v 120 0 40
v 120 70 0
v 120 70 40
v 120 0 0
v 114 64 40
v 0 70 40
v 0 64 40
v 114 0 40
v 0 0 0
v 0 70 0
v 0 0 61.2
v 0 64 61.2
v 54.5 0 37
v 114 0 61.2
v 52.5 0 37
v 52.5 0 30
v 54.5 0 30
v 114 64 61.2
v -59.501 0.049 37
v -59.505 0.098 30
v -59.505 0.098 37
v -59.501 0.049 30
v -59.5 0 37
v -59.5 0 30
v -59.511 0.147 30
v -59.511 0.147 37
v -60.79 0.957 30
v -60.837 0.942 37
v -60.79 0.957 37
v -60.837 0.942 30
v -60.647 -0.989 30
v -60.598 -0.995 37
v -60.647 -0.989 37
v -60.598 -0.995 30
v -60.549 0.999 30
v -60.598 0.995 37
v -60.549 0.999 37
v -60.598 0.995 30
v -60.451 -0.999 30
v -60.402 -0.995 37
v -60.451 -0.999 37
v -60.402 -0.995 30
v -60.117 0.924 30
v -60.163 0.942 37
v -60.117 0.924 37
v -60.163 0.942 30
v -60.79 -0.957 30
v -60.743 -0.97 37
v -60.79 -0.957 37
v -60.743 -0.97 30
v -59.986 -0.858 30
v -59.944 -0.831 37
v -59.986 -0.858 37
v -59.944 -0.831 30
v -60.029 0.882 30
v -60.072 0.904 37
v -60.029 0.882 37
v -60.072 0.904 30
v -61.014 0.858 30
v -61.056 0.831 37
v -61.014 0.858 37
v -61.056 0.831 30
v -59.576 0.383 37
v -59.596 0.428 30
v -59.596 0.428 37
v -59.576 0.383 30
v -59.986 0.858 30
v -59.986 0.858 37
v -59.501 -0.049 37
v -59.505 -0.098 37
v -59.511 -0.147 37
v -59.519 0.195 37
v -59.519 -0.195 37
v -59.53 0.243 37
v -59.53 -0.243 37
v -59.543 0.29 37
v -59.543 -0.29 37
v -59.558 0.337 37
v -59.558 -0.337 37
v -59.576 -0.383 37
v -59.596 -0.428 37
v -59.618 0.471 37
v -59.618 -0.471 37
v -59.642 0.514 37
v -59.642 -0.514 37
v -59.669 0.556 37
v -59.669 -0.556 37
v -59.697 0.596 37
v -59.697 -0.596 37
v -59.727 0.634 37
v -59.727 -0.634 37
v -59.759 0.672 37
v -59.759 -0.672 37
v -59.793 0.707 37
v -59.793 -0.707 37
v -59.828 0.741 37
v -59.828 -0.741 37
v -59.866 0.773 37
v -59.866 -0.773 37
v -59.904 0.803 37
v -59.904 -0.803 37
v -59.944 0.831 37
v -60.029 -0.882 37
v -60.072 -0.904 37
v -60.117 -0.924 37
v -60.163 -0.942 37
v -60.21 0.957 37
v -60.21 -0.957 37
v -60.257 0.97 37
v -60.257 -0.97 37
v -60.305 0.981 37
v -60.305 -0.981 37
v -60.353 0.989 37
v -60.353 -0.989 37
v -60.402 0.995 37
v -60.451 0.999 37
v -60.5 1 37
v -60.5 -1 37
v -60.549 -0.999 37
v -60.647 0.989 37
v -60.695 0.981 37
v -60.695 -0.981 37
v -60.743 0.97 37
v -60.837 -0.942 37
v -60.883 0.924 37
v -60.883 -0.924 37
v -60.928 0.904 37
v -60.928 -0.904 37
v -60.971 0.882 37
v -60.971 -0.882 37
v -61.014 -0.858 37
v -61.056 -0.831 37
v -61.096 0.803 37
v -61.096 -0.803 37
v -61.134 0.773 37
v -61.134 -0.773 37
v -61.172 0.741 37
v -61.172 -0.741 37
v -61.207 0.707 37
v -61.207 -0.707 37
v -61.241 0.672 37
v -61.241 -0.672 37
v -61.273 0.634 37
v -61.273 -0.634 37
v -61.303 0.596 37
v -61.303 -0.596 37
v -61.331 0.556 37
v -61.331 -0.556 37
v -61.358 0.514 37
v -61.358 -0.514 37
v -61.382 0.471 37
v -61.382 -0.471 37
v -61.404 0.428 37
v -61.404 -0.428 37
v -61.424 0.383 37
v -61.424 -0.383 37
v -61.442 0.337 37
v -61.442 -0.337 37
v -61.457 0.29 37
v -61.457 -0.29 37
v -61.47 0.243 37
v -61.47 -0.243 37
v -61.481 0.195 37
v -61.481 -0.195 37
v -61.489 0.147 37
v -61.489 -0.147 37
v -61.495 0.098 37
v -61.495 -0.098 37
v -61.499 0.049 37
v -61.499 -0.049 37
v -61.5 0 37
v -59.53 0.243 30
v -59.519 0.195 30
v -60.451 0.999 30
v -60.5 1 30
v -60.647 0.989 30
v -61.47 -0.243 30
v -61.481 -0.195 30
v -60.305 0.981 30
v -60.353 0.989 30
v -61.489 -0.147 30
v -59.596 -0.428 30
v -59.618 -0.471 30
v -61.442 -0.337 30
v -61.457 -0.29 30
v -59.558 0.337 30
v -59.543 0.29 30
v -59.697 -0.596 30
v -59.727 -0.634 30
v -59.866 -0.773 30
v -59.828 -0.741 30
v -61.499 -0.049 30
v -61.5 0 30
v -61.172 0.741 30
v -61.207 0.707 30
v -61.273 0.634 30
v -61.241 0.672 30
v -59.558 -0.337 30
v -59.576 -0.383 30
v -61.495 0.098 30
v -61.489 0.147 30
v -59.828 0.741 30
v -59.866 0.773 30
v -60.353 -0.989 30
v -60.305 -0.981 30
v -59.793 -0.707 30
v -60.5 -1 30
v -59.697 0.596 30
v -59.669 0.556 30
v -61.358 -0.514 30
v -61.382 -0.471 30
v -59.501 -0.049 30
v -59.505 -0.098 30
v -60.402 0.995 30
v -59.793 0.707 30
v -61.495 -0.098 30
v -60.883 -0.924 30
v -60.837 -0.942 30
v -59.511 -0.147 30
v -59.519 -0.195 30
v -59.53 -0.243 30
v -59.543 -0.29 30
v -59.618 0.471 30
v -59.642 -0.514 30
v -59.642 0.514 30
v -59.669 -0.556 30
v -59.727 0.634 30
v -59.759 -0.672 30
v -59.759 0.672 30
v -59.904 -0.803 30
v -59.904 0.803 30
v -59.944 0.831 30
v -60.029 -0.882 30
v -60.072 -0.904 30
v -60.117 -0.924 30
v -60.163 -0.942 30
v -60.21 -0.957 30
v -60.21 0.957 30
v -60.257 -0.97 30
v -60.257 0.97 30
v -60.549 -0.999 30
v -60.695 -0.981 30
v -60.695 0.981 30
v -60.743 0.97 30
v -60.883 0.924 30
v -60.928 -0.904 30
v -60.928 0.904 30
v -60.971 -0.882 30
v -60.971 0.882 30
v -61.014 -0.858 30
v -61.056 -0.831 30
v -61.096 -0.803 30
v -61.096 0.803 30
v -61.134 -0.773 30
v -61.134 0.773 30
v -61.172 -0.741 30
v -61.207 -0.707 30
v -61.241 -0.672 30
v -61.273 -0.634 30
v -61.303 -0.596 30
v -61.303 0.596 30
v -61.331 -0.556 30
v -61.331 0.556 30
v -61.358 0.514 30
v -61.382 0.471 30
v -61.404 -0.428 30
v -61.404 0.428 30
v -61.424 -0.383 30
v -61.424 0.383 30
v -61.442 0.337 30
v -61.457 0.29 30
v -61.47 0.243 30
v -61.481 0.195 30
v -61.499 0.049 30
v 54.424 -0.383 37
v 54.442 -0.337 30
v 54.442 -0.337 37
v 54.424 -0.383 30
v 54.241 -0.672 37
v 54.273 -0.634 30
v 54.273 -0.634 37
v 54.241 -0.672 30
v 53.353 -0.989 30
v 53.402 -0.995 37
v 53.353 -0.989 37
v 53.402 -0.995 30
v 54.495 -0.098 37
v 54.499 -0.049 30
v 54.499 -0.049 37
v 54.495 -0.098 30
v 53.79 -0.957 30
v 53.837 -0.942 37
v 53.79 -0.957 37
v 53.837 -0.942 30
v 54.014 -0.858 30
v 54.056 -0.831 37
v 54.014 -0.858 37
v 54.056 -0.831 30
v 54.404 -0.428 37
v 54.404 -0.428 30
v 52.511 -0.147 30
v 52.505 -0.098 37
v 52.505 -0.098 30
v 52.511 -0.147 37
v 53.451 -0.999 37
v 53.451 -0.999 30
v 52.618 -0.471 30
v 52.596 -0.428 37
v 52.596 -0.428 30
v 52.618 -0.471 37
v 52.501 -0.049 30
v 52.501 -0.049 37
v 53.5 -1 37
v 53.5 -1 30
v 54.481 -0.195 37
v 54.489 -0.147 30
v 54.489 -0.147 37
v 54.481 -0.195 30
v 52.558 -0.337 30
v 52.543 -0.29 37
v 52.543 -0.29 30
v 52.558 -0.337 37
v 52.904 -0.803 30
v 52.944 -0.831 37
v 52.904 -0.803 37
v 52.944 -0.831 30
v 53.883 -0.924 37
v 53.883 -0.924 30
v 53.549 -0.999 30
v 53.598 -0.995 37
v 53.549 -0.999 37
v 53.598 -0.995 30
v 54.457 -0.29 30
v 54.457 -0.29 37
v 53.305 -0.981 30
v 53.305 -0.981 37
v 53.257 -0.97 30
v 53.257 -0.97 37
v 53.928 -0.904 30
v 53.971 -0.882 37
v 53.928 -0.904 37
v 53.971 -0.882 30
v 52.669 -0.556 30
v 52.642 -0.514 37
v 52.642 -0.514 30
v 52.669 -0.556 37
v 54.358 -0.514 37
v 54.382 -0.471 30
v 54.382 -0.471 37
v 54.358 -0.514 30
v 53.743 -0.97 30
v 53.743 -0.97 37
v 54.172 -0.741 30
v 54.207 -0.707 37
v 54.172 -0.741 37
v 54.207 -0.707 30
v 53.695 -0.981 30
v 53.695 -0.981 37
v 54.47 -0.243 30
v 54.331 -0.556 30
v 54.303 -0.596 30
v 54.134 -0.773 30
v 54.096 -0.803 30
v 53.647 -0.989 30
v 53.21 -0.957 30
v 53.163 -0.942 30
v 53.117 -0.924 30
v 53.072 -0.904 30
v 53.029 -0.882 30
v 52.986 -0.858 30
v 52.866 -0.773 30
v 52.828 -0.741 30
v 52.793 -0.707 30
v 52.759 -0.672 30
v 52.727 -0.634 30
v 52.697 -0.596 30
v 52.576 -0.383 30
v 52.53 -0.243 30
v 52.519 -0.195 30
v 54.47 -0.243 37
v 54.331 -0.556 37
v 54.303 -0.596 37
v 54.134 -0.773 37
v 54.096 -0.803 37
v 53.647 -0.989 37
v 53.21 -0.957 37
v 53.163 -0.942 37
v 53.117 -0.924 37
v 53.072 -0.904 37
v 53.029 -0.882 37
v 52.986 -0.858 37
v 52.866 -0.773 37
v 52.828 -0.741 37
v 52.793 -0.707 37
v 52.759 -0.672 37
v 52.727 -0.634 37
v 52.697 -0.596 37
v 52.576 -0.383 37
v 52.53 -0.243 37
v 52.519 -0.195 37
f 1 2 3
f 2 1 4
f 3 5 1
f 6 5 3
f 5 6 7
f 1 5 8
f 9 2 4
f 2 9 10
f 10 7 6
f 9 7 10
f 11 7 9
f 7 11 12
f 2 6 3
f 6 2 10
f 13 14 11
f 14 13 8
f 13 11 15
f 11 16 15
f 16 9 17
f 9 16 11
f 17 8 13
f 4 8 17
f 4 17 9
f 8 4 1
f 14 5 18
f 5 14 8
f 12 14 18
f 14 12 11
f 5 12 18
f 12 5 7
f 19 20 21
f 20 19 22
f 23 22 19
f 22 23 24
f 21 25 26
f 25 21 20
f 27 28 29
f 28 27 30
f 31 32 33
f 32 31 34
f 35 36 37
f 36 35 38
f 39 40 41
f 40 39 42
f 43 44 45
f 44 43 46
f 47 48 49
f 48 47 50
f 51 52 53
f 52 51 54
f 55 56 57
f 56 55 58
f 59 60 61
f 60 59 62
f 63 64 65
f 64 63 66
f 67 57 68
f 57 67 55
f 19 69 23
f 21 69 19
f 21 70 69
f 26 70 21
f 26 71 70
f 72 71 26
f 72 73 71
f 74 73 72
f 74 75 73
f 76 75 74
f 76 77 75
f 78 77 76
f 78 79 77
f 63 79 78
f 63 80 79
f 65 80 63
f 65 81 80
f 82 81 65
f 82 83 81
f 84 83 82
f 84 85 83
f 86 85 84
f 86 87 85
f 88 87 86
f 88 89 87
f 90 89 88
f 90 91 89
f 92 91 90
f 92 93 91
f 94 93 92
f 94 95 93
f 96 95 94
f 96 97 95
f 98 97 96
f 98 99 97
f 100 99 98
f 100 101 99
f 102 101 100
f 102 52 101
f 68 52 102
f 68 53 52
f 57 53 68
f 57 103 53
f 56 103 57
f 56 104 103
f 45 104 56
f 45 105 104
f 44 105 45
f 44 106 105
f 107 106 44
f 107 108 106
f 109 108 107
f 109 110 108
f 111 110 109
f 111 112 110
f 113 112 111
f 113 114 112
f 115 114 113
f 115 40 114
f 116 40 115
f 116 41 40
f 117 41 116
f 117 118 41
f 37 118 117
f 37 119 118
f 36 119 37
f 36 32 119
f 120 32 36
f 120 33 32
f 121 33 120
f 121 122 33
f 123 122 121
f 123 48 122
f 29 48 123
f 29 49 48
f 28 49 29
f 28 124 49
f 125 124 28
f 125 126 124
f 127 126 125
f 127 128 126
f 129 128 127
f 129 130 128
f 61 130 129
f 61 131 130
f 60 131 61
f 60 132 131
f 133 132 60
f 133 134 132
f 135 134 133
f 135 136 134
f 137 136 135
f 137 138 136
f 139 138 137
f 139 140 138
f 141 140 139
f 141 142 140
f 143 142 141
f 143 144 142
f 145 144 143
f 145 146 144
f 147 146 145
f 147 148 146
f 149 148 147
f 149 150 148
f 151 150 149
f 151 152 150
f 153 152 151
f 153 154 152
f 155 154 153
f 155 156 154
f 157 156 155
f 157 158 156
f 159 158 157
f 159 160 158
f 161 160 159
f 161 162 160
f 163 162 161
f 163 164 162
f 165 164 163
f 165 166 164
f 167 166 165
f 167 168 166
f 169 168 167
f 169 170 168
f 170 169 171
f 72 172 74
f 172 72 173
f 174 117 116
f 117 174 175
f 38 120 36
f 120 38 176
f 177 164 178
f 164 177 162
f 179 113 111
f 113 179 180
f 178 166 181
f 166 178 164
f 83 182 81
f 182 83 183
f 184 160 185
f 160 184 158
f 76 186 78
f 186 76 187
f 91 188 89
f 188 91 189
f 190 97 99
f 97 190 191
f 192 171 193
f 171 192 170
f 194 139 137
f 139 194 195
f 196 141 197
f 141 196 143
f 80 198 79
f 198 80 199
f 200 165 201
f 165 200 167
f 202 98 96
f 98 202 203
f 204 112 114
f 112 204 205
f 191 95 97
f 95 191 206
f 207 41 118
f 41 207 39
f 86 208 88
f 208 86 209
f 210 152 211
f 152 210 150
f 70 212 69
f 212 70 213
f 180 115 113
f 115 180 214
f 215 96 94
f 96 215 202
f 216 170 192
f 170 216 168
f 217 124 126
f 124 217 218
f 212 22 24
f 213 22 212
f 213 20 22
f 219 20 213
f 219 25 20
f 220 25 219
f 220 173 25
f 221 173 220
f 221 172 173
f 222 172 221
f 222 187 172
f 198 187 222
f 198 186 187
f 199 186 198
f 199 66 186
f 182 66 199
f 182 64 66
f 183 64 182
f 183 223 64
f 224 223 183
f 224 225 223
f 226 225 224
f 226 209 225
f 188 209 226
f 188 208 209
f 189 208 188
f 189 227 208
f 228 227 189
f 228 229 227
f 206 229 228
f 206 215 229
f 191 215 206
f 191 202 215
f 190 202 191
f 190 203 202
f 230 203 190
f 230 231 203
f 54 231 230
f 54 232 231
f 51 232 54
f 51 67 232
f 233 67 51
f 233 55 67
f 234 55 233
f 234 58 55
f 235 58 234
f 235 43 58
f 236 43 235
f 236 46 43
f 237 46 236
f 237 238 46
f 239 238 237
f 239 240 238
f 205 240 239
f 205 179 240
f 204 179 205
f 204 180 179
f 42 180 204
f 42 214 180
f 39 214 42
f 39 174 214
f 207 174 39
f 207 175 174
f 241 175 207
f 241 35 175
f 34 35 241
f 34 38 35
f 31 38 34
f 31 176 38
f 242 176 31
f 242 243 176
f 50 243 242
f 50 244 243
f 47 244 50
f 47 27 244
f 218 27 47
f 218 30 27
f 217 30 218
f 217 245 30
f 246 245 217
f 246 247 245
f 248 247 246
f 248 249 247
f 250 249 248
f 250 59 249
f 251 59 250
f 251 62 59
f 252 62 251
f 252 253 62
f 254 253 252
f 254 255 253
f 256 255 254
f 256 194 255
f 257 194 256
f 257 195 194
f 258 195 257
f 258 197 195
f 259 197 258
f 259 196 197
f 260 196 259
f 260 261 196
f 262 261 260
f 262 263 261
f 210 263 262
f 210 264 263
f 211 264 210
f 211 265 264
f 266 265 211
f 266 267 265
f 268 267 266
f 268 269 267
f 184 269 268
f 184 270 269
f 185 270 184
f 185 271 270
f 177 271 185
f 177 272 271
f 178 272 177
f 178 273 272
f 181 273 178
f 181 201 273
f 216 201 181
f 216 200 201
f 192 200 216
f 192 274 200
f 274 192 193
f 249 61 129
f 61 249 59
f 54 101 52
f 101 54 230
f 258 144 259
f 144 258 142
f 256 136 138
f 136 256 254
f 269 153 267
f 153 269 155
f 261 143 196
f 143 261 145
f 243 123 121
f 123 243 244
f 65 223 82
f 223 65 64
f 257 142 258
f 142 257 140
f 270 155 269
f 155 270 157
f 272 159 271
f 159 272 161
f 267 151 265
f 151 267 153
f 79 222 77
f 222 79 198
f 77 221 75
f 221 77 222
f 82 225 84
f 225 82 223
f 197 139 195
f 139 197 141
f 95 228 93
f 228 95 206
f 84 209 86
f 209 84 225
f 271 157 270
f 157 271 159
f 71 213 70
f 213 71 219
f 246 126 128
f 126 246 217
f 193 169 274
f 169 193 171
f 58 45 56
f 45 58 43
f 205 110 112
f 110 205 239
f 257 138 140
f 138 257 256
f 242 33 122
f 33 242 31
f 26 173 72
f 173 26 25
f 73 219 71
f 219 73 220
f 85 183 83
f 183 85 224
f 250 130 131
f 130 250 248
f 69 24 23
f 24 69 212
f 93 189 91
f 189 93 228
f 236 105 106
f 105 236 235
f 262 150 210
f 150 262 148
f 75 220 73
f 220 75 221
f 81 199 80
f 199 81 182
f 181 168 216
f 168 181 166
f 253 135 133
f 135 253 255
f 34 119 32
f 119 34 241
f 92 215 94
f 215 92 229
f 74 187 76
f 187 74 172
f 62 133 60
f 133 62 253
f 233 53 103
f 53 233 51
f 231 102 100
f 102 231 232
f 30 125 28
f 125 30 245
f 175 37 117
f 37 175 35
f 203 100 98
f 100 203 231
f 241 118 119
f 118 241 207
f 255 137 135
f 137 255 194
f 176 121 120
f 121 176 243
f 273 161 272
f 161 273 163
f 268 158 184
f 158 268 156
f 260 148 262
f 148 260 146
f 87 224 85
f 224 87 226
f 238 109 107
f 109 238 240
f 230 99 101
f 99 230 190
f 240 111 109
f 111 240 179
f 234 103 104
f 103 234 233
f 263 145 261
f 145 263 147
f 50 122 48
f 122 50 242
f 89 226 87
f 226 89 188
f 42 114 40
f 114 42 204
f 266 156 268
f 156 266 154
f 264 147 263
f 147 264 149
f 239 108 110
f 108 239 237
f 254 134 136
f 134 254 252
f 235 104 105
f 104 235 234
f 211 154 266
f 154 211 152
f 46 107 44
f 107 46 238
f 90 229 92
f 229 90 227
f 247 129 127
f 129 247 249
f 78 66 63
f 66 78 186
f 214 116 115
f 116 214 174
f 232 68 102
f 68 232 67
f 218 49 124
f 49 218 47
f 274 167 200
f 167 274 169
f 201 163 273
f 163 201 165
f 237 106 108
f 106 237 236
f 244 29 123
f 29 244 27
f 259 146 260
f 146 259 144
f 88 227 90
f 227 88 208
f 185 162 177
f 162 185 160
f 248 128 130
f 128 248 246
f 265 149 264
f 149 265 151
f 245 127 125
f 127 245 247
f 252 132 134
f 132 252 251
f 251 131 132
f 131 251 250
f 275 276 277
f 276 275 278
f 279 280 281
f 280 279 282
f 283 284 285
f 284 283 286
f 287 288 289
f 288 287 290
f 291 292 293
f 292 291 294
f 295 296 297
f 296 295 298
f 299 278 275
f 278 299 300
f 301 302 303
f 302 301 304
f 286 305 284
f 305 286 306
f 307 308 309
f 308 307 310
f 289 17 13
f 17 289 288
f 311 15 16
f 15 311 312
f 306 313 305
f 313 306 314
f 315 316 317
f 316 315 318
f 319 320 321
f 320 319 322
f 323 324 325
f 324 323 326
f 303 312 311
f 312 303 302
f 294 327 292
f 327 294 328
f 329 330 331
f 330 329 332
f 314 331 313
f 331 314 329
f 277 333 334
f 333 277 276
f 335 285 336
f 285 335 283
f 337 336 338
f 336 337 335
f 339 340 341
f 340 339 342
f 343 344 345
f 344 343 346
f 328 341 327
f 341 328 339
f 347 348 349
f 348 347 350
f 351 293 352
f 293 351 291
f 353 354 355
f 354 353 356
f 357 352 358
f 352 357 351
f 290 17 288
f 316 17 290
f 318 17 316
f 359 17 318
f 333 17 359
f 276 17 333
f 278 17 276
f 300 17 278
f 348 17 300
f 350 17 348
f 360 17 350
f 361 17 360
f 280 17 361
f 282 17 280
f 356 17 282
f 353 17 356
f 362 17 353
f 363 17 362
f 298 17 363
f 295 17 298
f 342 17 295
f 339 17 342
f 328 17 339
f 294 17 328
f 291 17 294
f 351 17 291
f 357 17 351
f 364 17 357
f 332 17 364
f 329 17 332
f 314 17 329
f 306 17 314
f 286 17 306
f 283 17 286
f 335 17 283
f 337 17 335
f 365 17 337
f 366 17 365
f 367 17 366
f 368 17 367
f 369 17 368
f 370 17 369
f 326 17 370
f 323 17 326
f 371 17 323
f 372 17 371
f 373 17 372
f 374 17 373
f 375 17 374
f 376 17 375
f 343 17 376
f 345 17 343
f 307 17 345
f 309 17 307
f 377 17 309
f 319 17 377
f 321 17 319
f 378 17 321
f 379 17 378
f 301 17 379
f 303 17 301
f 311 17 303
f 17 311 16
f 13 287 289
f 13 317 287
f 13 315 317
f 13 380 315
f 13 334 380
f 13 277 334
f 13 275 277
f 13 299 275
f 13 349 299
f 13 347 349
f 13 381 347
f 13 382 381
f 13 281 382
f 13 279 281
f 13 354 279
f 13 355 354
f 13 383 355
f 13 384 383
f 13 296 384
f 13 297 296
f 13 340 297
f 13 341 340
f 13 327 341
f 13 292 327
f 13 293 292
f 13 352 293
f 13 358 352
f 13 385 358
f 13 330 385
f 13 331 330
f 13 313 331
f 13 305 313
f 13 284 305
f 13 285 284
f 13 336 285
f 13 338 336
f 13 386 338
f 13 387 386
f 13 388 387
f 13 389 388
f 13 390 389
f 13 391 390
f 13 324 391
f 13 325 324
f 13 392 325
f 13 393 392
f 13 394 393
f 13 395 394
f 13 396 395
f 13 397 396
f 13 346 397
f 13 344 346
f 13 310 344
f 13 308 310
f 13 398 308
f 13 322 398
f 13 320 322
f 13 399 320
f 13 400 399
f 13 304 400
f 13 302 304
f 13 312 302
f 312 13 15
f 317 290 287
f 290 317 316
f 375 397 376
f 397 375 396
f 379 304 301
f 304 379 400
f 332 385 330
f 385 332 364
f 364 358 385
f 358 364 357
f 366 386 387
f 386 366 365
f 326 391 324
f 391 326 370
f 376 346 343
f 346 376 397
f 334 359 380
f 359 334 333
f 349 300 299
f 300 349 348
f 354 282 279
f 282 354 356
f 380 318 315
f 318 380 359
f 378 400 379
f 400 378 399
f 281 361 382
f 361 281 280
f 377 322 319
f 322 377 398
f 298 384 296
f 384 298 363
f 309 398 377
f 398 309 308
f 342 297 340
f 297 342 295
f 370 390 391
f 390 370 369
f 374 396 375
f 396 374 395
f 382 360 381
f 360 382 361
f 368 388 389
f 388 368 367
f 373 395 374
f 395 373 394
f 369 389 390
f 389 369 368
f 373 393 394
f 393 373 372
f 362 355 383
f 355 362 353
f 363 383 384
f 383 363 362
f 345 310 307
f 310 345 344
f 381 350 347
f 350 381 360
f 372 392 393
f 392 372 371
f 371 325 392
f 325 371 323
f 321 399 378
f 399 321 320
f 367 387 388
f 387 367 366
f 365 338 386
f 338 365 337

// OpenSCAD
// Buffer Tank for Mini Horizontal Gel Electrophoresis
// Units: millimetres

// Outer Dimensions
$w_outer = 120; // X width
$d_outer = 70;  // Y depth
$h_outer = 40;  // Z height

// Wall and Floor Thickness
$w_thick = 3;   // Wall thickness
$f_thick = 3;   // Floor thickness

// Platform Dimensions
$p_len = 60;    // Platform length (X)
$p_width = $d_outer - 2*$w_thick; // Platform width (Y) - spans full inner width
$p_height = 10; // Platform height above inner floor
$p_z_base = $f_thick + $p_height; // Z position of platform top

// Electrode Hole Dimensions
$h_dia = 2;     // Hole diameter
$h_y = 0;       // Hole Y position
$h_z = 30;      // Hole Z position

// Configuration
$fn = 128;      // Resolution for curved shapes

// Derived Dimensions
$w_inner = $w_outer - 2*$w_thick;
$d_inner = $d_outer - 2*$w_thick;
$h_inner = $h_outer - $f_thick;

// Calculate positions for holes
// Holes are at the ends of the inner width, centered in Y and Z.
// Inner width is $w_inner. Ends are at +/- $w_inner/2.
// We need the cylinder to pass through the wall.
// Wall is at +/- $w_outer/2.
// Hole center is at +/- $w_inner/2.
// Distance from hole center to outer face = ($w_outer/2) - ($w_inner/2) = $w_thick.
// Cylinder length needs to extend past the outer face by a small margin.
$h_len = $w_thick + 0.5; // Extend 0.5mm past the wall face

module buffer_tank() {
    // 1. Construct the solid body (Union of Tank and Platform)
    // Tank: Full outer block
    translate([0, 0, 0])
        cube([
            $w_outer, 
            $d_outer, 
            $h_outer
        ]);
    
    // Platform: Added on top of the floor, centered in X, spanning full Y
    // Floor is at Z=0 to Z=$f_thick. Platform sits on floor.
    translate([
        ($w_outer - $p_len) / 2, // Centre in X
        0,                        // Centre in Y
        $f_thick                  // Base on floor
    ])
        cube([
            $p_len, 
            $p_width, 
            $p_height
        ]);
    
    // 2. Cut the top opening (Open Top)
    // The opening is the inner dimensions.
    // It starts from the top of the side walls (Z = $h_outer - $w_thick)
    // and goes down to the top of the platform (Z = $p_z_base).
    // We extend the cut slightly past the top face to ensure a clean cut.
    translate([0, 0, $h_outer - $w_thick + 0.1])
        cube([
            $w_inner, 
            $d_inner, 
            ($h_outer - $w_thick) - $p_z_base + 0.1 // Depth of cut
        ]);
    
    // 3. Cut the electrode holes
    // Two holes: one at each end (X = +/- $w_inner/2), 
    // along X axis, at Y = 0, Z = $h_z.
    // Cylinder axis is X.
    
    $hole_x_start = -$w_inner/2 - $h_len; // Start outside the tank
    $hole_x_end = -$w_inner/2 + $h_len;   // End inside the tank (and past the wall)
    
    // Left Hole
    translate([
        $hole_x_start,
        $h_y, 
        $h_z
    ])
        cylinder(
            h = $h_len * 2, // Length covers the full span needed
            r = $h_dia/2,
            $fn = $fn
        );
    
    // Right Hole
    translate([
        -$hole_x_end, // Mirror the start position
        $h_y, 
        $h_z
    ])
        cylinder(
            h = $h_len * 2,
            r = $h_dia/2,
            $fn = $fn
        );
}

// Render the part
buffer_tank();
